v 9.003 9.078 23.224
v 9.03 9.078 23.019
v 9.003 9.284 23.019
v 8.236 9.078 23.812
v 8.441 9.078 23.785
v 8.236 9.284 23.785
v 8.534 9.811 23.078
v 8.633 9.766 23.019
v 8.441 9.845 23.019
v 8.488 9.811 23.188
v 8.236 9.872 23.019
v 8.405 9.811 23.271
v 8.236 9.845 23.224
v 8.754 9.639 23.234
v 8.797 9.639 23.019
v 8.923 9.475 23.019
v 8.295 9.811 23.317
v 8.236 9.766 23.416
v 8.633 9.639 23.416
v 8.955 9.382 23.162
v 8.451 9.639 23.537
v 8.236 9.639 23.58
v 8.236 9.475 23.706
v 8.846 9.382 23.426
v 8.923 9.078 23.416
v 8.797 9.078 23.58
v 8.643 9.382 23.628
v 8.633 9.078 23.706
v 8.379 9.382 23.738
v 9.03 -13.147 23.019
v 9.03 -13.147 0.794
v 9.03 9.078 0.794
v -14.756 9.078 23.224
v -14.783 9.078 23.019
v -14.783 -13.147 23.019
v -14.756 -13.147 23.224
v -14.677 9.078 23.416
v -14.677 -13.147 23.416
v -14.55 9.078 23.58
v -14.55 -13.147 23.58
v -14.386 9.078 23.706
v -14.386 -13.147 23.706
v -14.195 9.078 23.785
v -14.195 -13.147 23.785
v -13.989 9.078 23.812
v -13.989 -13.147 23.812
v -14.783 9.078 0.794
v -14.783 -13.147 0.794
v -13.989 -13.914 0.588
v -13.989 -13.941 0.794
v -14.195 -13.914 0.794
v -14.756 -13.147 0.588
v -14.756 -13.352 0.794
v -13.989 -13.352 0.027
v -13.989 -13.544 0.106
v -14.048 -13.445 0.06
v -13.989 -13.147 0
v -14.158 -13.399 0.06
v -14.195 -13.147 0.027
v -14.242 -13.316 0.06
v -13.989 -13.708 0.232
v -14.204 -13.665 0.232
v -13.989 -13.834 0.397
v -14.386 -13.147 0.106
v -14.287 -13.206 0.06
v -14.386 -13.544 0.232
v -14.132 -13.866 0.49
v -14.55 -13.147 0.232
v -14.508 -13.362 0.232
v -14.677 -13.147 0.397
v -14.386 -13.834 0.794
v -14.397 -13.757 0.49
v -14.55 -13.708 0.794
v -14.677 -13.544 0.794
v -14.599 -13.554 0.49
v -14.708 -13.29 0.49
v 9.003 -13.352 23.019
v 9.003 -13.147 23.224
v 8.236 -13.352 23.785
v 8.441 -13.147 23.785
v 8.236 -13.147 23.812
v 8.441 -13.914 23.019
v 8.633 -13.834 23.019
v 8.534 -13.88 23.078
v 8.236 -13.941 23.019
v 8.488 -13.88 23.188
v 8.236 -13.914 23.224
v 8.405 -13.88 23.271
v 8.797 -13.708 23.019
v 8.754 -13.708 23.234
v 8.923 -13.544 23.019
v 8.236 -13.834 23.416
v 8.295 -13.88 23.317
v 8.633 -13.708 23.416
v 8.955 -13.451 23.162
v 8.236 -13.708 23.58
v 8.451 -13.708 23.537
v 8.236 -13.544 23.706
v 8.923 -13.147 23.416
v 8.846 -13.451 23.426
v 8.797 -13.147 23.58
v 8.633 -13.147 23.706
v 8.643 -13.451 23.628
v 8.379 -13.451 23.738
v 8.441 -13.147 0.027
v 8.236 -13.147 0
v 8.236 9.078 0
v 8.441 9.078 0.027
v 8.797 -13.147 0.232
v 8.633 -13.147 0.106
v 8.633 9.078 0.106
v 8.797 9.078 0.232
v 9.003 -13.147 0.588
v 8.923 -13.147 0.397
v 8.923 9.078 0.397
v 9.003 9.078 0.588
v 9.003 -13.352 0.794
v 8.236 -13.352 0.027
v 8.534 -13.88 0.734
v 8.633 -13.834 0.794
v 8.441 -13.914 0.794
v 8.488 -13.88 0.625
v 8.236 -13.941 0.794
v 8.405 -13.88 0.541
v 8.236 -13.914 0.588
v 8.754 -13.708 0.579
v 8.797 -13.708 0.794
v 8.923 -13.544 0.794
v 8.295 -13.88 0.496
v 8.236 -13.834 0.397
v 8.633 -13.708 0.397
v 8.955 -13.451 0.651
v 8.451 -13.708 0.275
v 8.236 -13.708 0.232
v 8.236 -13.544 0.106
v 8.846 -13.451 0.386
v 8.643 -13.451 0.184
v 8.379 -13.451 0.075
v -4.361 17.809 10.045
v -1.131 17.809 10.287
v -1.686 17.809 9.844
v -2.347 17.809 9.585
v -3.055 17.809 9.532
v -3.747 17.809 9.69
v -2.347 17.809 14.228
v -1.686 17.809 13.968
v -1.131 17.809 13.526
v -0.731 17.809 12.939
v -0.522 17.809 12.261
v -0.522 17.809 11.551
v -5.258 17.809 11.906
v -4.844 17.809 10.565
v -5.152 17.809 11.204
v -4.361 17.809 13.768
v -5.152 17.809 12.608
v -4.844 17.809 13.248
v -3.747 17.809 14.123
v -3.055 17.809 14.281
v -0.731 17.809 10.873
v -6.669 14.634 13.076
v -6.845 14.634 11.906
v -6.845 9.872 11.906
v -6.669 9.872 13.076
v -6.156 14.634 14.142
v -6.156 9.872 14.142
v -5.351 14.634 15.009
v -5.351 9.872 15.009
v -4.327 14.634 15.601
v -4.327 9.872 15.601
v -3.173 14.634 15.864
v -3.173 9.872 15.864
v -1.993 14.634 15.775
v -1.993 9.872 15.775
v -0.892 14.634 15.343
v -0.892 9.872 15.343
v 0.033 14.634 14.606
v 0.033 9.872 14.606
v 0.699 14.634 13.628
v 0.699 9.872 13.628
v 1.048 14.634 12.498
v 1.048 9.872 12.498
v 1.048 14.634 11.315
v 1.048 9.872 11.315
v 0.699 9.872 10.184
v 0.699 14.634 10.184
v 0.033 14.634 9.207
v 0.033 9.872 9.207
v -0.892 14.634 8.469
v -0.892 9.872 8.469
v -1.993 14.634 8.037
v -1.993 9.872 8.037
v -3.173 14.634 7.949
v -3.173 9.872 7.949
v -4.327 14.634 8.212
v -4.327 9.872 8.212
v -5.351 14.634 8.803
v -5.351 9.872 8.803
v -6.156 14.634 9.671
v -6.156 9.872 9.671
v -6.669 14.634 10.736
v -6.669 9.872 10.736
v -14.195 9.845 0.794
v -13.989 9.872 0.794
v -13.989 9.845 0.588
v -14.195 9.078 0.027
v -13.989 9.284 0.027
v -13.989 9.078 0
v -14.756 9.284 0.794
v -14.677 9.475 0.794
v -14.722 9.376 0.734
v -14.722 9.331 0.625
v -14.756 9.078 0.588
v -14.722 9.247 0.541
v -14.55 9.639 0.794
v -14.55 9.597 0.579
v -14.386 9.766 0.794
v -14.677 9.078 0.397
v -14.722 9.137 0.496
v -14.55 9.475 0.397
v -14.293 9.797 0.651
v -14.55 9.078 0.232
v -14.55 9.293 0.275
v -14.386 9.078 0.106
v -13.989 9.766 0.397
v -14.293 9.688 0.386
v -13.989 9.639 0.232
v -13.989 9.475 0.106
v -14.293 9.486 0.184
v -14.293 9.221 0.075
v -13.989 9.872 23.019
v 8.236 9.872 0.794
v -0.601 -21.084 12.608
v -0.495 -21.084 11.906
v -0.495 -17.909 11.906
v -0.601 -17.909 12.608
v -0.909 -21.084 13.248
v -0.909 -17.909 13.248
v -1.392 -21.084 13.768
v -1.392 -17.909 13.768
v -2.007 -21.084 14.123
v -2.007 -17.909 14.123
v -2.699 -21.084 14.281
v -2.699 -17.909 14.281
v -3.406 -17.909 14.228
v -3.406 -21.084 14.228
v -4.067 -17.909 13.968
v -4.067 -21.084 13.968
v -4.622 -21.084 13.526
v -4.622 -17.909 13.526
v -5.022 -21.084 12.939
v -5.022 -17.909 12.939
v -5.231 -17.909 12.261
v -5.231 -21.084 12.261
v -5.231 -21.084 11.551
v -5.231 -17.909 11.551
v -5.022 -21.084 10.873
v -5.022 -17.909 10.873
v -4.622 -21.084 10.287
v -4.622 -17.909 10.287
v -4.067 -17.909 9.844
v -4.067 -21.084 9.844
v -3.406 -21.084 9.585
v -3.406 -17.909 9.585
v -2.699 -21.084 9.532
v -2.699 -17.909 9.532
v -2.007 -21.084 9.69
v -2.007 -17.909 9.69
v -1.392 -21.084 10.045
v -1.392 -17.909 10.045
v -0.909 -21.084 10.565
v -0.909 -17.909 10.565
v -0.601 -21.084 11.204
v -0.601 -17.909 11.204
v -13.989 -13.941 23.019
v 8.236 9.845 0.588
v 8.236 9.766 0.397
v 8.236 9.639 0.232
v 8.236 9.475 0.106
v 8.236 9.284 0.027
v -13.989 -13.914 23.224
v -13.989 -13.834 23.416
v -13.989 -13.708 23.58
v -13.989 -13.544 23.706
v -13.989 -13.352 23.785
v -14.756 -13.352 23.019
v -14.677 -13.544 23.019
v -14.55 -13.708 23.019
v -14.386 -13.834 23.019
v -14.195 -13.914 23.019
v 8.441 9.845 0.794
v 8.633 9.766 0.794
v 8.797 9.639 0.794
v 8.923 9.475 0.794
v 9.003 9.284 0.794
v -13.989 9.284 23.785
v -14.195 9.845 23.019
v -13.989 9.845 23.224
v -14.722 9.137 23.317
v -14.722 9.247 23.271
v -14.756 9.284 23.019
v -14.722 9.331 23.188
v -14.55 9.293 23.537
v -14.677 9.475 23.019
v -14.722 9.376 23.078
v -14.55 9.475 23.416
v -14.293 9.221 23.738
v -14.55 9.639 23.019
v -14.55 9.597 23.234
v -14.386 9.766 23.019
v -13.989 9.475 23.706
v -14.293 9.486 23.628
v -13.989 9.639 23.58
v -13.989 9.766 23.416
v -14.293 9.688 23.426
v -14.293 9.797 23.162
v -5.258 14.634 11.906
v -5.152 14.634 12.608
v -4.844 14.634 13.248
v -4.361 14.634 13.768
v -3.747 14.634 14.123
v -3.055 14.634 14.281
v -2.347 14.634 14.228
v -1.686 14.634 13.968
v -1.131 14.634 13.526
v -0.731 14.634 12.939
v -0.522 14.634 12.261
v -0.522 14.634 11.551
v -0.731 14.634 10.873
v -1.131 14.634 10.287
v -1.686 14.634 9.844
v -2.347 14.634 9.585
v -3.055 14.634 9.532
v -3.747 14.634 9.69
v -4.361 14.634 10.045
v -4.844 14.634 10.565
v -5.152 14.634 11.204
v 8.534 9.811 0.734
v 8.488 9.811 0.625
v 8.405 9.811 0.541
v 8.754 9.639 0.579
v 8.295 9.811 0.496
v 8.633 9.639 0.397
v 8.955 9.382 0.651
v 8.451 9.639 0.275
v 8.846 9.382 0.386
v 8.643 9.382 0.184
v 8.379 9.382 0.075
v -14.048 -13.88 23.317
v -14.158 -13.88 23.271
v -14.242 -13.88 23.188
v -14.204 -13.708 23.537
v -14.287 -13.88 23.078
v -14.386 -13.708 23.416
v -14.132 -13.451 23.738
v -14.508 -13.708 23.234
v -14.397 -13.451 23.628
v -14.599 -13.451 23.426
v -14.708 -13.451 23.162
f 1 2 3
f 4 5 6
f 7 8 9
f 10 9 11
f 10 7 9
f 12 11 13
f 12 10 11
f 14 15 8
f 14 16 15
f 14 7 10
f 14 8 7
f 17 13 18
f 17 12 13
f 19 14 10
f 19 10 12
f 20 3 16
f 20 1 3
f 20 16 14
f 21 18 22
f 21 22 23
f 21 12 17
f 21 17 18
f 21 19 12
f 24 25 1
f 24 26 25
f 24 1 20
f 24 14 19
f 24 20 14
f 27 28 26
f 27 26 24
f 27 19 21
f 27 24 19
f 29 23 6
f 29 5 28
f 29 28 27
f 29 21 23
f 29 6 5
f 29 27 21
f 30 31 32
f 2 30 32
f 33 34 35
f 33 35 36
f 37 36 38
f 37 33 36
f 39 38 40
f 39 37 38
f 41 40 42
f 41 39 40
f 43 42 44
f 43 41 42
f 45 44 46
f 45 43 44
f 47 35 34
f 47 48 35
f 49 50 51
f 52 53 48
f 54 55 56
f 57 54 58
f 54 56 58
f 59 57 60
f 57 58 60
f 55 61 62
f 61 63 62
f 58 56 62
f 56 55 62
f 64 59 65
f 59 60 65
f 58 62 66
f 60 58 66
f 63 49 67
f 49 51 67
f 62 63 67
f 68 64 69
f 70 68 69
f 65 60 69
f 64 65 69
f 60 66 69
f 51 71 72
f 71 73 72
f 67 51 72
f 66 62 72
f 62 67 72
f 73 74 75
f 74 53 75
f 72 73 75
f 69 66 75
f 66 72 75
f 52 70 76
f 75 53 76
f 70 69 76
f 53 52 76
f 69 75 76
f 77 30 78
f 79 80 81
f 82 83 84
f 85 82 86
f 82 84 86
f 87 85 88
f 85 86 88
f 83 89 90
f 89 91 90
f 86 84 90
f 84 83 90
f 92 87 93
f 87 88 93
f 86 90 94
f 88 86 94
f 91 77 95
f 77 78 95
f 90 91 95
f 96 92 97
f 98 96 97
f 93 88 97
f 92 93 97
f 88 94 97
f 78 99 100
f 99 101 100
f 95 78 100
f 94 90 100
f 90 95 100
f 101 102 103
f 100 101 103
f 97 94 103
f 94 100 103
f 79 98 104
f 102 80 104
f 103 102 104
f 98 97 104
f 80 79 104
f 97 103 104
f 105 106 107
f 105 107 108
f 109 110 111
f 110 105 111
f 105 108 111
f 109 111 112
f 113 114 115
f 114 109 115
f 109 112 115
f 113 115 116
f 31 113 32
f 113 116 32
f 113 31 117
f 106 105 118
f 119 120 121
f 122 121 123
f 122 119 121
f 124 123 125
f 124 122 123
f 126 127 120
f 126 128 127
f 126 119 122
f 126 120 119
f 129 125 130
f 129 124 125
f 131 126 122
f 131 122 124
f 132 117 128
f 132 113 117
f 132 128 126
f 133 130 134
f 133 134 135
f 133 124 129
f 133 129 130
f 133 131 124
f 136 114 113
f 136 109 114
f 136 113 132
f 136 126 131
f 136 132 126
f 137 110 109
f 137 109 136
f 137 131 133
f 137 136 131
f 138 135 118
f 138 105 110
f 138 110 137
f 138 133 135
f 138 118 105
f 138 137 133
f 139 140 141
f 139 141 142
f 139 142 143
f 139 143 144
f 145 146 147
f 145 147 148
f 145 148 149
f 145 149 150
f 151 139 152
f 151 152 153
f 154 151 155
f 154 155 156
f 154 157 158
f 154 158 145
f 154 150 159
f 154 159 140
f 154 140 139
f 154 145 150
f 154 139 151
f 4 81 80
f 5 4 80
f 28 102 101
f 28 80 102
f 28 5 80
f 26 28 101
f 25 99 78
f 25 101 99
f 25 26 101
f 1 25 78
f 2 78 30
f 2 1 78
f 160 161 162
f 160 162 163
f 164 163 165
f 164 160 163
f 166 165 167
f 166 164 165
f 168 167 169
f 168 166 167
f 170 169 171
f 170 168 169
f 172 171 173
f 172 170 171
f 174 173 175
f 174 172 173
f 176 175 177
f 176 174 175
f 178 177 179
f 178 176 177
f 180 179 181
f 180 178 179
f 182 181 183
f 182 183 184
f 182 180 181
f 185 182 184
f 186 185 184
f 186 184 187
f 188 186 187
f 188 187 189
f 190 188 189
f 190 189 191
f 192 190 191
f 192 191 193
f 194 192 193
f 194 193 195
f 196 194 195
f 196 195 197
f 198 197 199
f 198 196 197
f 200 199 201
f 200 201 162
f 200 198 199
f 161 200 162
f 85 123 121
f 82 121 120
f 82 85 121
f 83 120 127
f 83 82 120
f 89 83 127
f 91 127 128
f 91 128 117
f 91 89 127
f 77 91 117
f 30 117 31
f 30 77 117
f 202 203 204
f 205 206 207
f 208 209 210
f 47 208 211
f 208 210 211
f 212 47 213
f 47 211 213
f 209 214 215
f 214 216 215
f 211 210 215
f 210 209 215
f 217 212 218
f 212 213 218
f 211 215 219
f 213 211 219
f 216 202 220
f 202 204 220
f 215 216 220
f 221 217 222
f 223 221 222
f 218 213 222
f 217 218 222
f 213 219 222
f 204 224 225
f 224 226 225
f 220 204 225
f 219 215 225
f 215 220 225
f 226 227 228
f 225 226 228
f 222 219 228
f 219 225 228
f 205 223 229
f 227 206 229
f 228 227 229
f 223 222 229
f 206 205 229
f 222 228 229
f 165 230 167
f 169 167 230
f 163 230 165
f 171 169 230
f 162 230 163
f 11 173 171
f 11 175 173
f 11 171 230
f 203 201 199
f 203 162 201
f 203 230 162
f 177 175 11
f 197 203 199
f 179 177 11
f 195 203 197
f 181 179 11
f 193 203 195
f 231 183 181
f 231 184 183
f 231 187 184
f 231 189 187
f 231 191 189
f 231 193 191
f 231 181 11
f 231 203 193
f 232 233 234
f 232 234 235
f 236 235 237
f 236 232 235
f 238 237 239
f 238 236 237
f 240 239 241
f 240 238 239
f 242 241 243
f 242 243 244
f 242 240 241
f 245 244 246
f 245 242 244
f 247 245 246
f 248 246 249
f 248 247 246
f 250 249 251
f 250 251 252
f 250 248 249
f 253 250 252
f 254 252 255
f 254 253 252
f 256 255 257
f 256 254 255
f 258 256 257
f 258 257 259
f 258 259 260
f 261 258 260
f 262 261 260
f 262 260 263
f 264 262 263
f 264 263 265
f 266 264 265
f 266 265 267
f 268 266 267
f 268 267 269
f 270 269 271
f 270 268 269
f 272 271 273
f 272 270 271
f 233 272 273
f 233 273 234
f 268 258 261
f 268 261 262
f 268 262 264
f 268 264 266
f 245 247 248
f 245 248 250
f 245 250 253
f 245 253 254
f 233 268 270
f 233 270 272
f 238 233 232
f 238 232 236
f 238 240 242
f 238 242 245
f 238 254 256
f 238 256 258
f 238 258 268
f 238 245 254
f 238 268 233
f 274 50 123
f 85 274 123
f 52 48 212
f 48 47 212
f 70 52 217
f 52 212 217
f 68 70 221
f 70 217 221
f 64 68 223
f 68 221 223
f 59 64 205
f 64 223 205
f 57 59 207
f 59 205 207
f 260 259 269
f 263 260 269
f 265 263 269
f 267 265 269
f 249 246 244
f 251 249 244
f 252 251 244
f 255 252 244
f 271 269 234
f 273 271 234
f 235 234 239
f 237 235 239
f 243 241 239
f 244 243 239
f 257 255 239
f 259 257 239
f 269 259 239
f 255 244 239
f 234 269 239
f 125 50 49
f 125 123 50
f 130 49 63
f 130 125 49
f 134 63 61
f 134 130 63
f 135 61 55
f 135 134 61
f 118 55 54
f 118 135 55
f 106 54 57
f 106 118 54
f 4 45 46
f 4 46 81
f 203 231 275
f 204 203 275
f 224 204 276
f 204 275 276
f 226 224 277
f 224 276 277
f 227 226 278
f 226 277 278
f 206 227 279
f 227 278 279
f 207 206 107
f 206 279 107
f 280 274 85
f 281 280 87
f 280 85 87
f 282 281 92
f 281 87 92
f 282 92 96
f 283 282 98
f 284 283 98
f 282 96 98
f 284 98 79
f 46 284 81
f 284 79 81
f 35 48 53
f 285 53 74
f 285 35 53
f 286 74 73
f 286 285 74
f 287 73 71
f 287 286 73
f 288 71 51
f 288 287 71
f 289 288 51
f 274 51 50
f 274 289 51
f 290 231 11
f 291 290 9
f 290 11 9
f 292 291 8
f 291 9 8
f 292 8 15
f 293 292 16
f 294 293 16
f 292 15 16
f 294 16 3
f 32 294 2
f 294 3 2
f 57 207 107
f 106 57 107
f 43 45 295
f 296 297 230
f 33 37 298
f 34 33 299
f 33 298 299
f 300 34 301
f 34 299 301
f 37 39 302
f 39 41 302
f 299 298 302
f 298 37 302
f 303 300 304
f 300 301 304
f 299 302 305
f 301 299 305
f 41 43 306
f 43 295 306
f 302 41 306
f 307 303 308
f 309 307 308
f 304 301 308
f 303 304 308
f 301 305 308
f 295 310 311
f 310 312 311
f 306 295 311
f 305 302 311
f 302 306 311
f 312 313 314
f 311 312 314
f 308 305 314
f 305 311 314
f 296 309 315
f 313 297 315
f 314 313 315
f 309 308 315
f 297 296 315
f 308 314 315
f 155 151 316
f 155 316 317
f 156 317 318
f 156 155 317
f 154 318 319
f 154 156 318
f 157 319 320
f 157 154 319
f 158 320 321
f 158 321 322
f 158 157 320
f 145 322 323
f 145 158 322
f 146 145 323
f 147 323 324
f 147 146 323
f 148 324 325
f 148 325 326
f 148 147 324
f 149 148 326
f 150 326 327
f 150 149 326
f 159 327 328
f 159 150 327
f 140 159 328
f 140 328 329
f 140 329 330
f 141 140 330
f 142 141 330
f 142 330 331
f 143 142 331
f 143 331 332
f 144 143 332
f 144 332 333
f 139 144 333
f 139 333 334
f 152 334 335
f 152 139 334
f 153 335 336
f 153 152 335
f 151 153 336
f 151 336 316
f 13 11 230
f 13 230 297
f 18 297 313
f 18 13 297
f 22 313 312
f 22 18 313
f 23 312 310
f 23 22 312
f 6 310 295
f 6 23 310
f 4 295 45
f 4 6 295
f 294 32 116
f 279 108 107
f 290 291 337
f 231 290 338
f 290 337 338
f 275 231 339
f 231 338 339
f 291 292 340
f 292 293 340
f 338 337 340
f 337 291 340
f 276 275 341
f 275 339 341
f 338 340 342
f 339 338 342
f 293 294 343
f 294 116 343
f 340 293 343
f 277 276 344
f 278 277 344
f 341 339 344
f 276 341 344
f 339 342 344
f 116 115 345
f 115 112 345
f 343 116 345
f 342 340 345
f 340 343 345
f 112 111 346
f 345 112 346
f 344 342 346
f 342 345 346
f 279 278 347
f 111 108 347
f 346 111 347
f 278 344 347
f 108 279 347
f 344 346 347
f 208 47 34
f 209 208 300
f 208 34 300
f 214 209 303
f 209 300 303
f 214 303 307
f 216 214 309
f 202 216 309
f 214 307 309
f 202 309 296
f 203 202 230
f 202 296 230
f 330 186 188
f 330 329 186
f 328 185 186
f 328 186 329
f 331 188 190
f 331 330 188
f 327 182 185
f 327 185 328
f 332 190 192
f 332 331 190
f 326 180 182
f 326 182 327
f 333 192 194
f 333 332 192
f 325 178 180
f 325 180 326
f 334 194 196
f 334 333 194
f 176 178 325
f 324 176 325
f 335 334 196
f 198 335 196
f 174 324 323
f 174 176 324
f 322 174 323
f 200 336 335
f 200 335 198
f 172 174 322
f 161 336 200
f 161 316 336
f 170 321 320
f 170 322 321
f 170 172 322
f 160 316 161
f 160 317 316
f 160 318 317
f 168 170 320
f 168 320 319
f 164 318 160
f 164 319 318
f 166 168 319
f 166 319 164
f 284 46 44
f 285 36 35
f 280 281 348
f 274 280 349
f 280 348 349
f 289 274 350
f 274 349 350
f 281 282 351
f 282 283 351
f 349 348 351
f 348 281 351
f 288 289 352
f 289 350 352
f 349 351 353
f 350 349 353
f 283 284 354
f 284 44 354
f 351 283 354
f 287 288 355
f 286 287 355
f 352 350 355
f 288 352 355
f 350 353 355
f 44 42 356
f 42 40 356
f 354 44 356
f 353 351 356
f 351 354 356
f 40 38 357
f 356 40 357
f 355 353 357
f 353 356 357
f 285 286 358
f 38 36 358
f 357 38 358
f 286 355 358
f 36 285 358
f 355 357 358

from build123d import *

# Parameters (mm, degrees)
F0_W      = 23.8125
F0_H      = 23.8125
F1_DEPTH  = 23.8125
F6_R      = 2.38125
F7_DEPTH  = 3.175
F9_R      = 3.96875
F10_DEPTH = 4.7625
F12_R     = 2.38125
F13_DEPTH = 3.175
F14_R     = 0.79375


# Not quite as in the source:
# - a length typed as a fraction of an inch, garbled in the dataset ("3 / 203.2 mm" for 3/8 in), is restored
# - the program builds the solid bodies; features that only make, move or delete a surface that nothing else refers to are left out


with BuildPart() as f1:
    # F0 (on Top) → F1 (new body)
    with BuildSketch(Plane.XY):
        with Locations((-2.8766207397, -2.0344056764)):
            Rectangle(F0_W, F0_H)
    extrude(amount=F1_DEPTH)

    # F9 (on offset) → F10 (join)
    with BuildSketch(Plane(origin=(0, 14.6343443236, 0), x_dir=(-1, 0, 0), z_dir=(0, 1, 0))):
        with Locations((2.8766207397, 11.90625)):
            Circle(F9_R)
    extrude(amount=-F10_DEPTH)

    # F12 (on offset) → F13 (join)
    with BuildSketch(Plane(origin=(0, 17.8093443236, 0), x_dir=(-1, 0, 0), z_dir=(0, 1, 0))):
        with Locations((2.8766207397, 11.90625)):
            Circle(F12_R)
    extrude(amount=-F13_DEPTH)

    # F14
    f14_edges = [f1.edges().sort_by_distance(p)[0] for p in [
        (9.029629, -2.034406, 0),
        (9.029629, -2.034406, 23.8125),
        (9.029629, -13.940656, 11.90625),
        (9.029629, 9.871844, 11.90625),
        (-2.876621, 9.871844, 23.8125),
        (-14.782871, -2.034406, 23.8125),
        (-2.876621, -13.940656, 23.8125),
        (-2.876621, 9.871844, 0),
        (-14.782871, 9.871844, 11.90625),
        (-14.782871, -13.940656, 11.90625),
        (-2.876621, -13.940656, 0),
        (-14.782871, -2.034406, 0),
    ]]
    fillet(f14_edges, radius=F14_R)


with BuildPart() as f7:
    # F6 (on offset) → F7 (new body)
    with BuildSketch(Plane.XZ.offset(21.0844056764)):
        with Locations((-2.8766207397, 11.90625)):
            Circle(F6_R)
    extrude(amount=-F7_DEPTH)


solid = Compound([f1.part, f7.part])
